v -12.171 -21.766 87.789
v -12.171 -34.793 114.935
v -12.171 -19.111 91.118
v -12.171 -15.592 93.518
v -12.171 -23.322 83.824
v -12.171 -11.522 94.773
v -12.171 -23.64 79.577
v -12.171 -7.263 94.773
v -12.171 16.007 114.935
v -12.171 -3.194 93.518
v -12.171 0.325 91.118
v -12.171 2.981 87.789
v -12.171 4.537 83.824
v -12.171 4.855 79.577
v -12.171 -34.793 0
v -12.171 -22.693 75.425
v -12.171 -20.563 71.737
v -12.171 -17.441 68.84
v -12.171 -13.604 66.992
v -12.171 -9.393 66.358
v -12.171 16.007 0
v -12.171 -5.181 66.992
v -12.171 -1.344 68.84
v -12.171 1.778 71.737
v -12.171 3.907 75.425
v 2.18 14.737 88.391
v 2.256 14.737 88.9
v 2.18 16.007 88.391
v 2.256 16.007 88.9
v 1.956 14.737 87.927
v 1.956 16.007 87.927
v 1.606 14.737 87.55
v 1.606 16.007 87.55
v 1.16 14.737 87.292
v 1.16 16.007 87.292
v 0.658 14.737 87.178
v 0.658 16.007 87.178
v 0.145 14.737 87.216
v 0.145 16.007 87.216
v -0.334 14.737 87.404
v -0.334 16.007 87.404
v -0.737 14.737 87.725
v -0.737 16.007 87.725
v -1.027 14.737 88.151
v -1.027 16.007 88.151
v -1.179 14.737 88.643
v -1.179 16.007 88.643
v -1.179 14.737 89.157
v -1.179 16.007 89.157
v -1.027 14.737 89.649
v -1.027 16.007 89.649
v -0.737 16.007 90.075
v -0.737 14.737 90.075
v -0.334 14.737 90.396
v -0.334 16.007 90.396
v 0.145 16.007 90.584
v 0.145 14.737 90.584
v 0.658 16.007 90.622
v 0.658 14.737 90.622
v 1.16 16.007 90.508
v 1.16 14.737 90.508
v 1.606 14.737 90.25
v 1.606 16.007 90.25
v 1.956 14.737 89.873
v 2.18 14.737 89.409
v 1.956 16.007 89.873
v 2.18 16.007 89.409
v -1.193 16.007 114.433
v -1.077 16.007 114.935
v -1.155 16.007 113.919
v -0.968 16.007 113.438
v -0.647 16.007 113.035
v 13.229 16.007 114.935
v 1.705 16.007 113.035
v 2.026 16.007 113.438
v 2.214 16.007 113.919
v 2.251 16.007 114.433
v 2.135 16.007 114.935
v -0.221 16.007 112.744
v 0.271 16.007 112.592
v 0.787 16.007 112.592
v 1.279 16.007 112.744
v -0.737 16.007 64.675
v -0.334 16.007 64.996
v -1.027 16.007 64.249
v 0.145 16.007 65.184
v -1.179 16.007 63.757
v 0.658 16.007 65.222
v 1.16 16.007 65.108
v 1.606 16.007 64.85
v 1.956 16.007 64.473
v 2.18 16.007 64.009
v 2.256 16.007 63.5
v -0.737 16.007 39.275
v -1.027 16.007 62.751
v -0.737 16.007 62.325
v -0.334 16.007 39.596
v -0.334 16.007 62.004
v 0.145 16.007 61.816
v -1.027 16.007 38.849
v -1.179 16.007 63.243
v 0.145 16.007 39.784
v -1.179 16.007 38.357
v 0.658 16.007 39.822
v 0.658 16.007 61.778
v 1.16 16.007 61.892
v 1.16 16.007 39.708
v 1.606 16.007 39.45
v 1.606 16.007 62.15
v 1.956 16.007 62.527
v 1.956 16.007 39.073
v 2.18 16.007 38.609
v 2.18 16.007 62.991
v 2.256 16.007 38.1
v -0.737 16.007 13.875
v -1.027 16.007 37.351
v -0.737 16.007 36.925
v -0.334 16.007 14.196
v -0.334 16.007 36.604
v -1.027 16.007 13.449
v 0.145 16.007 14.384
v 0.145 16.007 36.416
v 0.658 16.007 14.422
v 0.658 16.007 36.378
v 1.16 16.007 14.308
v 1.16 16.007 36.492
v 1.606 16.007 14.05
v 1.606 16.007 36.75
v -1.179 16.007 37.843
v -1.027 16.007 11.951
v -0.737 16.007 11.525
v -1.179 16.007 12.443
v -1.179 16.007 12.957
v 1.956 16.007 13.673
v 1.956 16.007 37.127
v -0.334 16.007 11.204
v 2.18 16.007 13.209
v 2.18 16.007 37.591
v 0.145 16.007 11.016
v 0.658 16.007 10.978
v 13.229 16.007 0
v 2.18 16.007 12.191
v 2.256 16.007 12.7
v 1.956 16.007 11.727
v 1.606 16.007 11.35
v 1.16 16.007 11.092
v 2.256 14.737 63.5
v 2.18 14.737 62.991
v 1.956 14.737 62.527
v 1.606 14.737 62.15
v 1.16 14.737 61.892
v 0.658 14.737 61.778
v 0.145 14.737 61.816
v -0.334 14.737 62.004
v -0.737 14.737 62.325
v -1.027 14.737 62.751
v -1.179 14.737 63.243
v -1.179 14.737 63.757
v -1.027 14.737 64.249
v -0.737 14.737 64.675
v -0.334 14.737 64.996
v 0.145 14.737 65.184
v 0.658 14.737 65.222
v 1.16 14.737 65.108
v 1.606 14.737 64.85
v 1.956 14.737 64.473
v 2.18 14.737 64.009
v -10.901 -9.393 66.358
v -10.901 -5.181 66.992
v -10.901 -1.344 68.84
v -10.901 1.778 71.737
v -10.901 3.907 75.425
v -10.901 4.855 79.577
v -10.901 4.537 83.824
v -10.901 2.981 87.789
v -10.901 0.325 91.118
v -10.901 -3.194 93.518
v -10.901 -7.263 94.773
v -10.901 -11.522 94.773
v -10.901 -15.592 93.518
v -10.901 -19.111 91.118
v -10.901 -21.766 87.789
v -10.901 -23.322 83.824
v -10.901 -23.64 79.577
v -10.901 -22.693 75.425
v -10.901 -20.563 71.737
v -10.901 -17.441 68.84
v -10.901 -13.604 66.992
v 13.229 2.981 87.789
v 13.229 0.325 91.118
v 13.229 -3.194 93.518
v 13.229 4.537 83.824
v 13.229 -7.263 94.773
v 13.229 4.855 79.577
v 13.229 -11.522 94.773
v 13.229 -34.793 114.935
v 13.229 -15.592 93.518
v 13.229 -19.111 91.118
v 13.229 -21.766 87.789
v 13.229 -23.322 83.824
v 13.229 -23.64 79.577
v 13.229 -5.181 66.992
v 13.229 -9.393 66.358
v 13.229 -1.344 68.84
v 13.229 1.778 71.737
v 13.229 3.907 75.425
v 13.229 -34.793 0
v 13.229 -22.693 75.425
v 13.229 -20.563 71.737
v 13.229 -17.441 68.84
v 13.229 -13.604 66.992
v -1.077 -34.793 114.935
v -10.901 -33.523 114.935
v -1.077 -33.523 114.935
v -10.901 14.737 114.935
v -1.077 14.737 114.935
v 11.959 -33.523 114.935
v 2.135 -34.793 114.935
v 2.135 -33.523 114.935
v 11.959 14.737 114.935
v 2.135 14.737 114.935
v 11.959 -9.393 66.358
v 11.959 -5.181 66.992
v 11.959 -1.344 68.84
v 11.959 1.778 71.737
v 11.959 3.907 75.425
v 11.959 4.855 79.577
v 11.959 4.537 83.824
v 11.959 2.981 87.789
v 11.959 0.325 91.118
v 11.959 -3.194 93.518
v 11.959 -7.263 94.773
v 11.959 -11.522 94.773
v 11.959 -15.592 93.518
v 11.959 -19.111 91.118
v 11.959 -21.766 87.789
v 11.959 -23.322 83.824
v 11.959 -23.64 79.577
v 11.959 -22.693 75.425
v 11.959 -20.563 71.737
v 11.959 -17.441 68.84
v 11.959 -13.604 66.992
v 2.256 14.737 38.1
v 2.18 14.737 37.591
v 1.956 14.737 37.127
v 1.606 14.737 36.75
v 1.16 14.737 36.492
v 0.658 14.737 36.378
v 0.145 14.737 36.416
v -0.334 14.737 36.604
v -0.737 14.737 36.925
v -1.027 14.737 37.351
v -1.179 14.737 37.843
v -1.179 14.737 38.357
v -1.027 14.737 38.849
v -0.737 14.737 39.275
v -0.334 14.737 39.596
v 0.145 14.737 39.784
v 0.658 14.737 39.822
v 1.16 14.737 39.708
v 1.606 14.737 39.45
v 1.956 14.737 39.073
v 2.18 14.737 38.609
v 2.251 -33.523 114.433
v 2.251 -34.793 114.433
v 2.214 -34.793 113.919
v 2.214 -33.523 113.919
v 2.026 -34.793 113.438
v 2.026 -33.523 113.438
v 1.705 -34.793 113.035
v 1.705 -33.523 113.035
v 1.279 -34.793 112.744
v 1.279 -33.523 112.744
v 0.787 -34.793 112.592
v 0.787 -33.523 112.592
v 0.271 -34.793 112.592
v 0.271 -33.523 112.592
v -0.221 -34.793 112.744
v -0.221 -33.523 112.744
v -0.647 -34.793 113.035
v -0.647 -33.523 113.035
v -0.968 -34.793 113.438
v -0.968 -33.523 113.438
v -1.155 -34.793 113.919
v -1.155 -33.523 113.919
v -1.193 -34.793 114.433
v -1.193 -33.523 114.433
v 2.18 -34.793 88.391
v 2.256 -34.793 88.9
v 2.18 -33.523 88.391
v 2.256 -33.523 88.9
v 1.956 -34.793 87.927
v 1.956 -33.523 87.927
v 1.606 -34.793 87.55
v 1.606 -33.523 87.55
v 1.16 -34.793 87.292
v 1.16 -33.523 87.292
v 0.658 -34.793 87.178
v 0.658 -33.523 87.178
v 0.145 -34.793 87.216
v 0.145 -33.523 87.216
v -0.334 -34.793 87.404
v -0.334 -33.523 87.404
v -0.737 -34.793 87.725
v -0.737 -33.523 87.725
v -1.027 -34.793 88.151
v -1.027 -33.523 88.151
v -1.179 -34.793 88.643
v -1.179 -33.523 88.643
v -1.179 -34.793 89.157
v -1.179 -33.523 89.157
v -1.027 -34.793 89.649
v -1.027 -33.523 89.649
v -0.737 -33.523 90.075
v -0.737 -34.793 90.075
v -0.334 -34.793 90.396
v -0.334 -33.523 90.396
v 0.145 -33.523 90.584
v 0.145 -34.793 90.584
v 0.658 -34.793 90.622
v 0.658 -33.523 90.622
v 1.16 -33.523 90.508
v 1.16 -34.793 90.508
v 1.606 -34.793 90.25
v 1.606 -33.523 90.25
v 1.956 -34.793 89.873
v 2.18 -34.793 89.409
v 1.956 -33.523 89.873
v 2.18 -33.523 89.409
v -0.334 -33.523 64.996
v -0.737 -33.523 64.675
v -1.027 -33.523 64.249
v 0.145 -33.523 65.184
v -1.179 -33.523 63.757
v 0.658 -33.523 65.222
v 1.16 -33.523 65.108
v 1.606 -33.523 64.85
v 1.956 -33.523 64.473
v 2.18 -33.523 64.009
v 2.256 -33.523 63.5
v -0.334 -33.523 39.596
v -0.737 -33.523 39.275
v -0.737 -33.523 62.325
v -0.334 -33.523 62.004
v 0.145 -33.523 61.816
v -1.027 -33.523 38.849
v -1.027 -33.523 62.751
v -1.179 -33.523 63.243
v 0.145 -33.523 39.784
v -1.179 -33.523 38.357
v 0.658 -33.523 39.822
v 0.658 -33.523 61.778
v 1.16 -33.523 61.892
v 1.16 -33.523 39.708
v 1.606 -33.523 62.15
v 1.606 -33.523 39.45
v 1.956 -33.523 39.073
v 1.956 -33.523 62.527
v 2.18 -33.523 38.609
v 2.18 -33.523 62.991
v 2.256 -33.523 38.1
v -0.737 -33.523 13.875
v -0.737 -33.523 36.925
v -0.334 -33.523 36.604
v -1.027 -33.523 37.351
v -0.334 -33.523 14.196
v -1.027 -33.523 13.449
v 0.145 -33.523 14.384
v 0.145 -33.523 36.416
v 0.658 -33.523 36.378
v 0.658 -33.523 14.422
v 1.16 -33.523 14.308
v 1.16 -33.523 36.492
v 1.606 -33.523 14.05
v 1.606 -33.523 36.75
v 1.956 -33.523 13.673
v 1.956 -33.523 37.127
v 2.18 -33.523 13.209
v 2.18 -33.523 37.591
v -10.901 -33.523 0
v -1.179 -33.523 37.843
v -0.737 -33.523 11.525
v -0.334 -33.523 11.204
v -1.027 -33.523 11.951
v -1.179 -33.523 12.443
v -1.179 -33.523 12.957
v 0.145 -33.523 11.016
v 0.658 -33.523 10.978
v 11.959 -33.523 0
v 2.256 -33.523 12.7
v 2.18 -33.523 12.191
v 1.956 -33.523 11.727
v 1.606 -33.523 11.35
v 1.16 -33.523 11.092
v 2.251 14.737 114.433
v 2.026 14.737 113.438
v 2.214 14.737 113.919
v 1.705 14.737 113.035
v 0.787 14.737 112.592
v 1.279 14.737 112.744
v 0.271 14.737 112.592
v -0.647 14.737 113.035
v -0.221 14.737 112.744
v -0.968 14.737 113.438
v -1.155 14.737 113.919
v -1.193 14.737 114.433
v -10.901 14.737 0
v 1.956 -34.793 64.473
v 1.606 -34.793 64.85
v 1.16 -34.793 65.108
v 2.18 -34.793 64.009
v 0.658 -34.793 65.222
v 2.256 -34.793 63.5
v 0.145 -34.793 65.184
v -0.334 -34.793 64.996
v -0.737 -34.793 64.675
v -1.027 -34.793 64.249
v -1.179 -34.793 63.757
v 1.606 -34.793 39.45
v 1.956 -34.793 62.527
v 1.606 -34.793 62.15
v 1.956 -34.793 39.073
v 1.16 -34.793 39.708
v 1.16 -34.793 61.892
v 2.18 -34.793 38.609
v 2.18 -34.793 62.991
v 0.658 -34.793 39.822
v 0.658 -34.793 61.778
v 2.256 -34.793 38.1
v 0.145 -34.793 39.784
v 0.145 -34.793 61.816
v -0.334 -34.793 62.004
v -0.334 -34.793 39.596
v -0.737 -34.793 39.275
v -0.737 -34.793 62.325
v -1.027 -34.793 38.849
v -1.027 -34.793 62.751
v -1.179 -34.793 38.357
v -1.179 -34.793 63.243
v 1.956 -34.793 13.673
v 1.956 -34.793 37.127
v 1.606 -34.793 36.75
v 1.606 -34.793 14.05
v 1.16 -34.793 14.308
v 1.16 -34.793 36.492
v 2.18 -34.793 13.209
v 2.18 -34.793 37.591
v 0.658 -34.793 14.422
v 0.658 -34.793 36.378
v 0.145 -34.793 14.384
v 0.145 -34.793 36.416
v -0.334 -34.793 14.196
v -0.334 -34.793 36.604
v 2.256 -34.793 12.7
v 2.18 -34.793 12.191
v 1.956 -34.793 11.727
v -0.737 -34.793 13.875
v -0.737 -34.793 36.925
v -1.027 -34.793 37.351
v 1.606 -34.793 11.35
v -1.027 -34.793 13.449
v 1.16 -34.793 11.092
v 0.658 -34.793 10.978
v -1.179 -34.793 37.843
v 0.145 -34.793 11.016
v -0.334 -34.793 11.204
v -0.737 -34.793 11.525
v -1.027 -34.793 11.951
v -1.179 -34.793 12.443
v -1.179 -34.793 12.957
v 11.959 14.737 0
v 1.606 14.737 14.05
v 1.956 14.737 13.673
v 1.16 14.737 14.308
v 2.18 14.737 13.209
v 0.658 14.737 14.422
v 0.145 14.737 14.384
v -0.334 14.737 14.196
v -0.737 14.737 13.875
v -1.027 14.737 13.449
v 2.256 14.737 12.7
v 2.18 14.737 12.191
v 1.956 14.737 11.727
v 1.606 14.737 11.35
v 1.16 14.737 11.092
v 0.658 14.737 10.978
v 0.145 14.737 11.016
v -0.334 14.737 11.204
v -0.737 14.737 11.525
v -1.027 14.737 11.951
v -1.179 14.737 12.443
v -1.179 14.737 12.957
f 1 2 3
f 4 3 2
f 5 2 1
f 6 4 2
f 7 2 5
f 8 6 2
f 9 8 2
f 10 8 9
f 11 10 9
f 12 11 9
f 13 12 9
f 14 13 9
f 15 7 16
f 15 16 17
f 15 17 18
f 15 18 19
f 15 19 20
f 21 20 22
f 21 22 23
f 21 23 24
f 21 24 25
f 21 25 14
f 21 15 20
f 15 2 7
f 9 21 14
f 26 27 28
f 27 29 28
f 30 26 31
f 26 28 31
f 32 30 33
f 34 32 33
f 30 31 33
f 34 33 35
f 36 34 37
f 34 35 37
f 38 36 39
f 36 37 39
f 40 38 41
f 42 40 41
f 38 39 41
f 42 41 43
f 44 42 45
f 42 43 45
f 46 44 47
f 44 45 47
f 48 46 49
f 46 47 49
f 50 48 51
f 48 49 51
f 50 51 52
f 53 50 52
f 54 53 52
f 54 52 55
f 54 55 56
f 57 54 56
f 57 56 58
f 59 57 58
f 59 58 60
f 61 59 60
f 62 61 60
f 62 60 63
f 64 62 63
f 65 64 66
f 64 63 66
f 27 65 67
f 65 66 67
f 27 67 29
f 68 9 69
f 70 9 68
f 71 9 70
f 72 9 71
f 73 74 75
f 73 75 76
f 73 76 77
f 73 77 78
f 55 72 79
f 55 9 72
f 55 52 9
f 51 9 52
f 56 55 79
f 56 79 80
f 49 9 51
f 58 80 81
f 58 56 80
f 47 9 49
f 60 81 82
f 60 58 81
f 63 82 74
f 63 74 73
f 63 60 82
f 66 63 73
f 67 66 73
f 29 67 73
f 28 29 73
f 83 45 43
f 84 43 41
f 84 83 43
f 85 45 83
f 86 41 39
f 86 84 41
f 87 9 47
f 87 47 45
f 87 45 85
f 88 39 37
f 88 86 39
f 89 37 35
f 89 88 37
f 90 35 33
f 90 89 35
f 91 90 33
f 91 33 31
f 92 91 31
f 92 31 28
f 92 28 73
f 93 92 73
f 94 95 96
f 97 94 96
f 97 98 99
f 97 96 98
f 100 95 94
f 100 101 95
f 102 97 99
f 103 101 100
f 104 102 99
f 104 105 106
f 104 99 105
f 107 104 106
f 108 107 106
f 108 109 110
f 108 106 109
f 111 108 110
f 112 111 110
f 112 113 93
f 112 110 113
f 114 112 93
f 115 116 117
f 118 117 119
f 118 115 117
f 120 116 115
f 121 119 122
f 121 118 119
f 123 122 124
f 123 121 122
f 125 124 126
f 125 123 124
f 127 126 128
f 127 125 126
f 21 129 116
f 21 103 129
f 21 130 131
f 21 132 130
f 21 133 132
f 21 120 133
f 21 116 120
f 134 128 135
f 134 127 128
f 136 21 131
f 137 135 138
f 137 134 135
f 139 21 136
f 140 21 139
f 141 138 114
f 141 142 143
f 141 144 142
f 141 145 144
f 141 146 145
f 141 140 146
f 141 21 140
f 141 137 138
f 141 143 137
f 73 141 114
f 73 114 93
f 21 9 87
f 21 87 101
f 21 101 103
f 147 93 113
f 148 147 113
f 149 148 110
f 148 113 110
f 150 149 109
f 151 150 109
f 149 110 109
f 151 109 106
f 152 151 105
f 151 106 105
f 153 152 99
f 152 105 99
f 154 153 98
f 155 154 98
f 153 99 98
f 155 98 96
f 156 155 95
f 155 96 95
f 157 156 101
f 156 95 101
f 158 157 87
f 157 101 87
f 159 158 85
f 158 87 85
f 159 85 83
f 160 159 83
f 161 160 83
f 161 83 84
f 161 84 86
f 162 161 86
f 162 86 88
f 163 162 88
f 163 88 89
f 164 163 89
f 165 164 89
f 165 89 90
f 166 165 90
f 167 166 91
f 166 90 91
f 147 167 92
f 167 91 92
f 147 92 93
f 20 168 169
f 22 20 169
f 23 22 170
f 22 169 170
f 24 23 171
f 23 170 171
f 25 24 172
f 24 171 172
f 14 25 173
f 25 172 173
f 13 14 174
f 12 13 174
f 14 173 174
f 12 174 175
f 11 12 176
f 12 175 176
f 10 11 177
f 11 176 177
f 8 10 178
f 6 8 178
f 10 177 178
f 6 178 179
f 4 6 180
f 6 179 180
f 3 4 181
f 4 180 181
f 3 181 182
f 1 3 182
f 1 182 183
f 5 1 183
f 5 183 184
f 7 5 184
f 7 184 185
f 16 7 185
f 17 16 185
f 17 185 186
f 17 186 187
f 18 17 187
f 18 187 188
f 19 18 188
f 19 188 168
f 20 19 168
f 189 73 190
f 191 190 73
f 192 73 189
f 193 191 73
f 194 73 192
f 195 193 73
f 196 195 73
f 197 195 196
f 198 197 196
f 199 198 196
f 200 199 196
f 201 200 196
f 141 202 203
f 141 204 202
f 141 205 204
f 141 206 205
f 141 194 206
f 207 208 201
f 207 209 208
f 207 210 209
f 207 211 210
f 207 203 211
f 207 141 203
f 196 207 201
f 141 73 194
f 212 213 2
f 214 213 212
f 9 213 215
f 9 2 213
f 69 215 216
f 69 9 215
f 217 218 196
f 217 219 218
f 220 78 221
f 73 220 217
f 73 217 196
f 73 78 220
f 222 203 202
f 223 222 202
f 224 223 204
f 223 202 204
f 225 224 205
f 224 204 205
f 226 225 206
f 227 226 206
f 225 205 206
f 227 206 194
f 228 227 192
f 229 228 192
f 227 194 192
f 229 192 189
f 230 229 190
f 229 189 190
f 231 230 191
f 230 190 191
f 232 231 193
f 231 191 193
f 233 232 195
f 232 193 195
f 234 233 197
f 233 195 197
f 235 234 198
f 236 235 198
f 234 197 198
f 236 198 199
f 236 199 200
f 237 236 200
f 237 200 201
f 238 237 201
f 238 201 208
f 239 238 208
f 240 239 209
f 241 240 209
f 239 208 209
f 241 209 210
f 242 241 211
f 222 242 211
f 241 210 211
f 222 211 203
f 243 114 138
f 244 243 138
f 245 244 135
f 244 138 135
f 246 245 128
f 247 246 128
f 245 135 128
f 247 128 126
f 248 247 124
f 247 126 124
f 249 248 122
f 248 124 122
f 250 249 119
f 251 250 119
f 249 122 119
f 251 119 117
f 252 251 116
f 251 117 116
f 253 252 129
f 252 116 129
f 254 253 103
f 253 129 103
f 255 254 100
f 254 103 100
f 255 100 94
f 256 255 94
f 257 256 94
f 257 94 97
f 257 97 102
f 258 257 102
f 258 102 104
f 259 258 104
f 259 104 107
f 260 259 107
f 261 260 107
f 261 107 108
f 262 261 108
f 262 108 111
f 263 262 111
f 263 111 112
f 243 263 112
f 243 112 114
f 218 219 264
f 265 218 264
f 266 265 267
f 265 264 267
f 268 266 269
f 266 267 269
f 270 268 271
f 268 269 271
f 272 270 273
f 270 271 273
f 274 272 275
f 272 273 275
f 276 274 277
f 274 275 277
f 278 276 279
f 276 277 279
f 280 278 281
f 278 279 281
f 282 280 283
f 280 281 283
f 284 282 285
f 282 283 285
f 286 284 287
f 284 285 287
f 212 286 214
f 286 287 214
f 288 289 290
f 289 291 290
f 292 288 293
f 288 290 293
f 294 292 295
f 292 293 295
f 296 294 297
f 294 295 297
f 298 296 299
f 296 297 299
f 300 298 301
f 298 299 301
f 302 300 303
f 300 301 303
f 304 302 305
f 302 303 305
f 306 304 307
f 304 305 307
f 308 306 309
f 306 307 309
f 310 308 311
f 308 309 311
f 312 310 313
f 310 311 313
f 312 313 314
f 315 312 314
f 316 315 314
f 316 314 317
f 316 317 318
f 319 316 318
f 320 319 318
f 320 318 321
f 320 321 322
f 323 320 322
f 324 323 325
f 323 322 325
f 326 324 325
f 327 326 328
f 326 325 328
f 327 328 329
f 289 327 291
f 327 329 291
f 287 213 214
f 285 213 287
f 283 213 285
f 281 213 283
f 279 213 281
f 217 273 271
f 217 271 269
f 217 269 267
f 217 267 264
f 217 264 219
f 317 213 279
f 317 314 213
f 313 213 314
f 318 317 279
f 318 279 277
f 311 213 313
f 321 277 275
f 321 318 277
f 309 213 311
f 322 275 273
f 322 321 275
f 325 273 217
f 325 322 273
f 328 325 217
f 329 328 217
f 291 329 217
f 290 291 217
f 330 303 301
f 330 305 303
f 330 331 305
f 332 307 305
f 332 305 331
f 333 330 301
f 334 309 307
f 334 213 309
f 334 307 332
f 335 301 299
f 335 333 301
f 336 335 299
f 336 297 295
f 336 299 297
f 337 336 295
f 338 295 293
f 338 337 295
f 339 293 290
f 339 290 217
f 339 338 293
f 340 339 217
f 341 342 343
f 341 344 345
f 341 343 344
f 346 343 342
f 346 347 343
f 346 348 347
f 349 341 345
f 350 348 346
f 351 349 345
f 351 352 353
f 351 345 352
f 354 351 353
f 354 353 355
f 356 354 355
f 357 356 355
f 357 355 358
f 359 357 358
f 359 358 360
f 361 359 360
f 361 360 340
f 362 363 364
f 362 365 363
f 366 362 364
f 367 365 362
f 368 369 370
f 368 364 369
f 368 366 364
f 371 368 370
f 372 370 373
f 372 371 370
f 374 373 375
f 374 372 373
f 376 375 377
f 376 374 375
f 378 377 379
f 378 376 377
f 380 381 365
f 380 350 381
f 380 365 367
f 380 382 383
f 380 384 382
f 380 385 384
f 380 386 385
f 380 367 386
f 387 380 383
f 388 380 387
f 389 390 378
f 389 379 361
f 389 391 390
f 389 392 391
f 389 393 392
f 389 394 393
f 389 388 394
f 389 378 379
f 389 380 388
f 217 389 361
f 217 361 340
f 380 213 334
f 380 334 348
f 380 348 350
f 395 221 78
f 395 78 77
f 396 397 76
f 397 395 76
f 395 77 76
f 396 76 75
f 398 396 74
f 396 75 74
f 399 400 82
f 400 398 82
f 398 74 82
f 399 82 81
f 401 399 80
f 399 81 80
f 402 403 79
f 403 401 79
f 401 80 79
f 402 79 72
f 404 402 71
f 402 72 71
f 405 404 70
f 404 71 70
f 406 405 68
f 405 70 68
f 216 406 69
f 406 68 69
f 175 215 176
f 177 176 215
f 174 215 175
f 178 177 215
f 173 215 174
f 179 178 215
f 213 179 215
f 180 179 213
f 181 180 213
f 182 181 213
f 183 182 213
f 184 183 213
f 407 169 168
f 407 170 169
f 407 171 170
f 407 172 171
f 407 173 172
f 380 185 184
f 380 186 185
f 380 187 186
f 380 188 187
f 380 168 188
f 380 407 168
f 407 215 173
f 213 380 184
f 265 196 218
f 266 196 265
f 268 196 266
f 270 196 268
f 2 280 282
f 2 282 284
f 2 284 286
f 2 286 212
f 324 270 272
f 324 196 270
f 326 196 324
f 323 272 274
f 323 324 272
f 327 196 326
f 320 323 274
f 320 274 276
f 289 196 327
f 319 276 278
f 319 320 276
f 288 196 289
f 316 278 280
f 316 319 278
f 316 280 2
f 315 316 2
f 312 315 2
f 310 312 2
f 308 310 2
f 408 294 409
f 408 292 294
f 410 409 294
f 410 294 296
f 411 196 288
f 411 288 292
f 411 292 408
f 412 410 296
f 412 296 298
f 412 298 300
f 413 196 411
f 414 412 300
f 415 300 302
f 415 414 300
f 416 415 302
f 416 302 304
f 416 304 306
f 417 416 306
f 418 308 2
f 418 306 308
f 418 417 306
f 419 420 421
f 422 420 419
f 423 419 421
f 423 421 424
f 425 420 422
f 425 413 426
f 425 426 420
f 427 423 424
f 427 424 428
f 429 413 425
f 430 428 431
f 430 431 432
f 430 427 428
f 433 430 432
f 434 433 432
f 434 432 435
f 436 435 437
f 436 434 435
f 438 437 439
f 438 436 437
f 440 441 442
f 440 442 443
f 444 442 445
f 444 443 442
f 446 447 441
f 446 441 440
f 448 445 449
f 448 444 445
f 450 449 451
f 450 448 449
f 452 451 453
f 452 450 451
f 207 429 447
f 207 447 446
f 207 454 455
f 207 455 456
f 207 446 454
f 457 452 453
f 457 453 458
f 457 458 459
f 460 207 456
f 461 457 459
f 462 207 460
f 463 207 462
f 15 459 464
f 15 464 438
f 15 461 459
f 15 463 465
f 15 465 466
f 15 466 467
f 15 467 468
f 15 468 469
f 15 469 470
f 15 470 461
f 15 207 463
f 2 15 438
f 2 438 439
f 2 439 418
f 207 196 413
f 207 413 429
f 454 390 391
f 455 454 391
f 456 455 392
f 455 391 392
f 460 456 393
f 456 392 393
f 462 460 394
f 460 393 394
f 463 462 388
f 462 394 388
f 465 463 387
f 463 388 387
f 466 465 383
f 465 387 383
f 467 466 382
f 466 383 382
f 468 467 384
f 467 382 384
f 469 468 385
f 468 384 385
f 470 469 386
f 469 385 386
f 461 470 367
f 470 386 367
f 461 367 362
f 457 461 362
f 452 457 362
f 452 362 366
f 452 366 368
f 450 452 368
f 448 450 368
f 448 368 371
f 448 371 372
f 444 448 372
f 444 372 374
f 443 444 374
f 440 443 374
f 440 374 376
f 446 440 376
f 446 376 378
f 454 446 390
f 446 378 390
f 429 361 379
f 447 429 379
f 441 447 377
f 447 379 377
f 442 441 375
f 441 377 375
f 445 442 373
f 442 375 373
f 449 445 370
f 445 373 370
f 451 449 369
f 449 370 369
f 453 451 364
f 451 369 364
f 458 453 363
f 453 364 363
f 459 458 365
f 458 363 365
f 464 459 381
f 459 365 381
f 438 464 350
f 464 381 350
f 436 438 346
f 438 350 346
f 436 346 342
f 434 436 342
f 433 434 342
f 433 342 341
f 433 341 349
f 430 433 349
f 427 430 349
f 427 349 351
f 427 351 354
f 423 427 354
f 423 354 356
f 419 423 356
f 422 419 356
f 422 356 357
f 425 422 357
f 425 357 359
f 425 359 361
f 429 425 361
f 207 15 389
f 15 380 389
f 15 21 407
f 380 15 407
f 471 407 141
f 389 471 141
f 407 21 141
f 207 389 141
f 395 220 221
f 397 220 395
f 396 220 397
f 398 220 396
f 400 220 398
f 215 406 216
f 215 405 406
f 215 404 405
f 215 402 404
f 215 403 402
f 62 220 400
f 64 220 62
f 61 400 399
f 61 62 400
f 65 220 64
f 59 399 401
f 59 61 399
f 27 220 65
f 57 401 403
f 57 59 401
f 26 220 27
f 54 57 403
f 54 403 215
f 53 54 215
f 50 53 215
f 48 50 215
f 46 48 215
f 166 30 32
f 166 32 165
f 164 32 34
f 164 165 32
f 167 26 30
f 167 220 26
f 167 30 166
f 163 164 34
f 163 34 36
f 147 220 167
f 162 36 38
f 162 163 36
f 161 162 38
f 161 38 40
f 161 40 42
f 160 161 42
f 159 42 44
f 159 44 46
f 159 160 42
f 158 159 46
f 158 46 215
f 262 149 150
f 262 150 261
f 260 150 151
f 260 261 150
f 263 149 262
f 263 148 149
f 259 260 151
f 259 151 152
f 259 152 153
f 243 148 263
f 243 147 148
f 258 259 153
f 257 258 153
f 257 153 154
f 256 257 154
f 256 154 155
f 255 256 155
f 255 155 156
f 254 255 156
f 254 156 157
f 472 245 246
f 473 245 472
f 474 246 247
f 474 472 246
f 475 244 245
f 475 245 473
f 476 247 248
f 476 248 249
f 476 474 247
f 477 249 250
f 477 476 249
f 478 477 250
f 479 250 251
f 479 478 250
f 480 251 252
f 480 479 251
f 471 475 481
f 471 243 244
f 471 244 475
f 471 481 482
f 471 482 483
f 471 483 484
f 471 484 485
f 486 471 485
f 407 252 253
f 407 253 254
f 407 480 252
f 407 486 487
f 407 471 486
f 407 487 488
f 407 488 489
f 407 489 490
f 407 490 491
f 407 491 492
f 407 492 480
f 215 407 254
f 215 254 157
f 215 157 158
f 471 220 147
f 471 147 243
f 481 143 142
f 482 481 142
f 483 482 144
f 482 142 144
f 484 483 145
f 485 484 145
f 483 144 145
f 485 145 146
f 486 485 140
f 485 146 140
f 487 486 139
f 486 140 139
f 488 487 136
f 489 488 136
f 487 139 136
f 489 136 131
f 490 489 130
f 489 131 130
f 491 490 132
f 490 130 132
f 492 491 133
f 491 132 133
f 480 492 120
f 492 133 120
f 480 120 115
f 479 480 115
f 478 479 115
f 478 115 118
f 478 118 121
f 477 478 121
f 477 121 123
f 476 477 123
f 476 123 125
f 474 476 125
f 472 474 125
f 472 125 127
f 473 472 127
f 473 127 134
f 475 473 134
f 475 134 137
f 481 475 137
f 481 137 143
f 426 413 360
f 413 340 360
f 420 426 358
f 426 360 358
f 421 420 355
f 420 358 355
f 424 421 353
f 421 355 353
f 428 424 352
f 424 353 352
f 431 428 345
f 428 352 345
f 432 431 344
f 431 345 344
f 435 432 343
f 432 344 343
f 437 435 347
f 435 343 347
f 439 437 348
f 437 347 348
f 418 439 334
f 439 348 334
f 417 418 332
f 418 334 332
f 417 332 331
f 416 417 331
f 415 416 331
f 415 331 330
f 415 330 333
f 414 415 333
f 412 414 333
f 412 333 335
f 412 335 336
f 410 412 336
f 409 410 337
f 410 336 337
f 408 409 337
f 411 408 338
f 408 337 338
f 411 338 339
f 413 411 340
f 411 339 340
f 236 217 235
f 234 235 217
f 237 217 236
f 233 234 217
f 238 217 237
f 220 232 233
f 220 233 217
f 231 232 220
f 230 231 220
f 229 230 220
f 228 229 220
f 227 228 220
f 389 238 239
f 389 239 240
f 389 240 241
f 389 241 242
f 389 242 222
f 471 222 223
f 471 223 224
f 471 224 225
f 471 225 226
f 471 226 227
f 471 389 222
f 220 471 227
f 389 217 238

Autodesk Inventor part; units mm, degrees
ref_plane "YZ Plane" through (0, 0, 0) normal (1, 0, 0) x (0, 1, 0)
ref_plane "XZ Plane" through (0, 0, 0) normal (0, 1, 0) x (-1, 0, 0)
ref_plane "XY Plane" through (0, 0, 0) normal (0, 0, 1) x (1, 0, 0)
sketch "Sketch1" plane through (0, 0, 0) normal (0, 0, 1) x (1, 0, 0)
  line L0 (-12.1708, 16.0073) -> (13.2292, 16.0073)
  line L1 (13.2292, 16.0073) -> (13.2292, -34.7927)
  line L2 (13.2292, -34.7927) -> (-12.1708, -34.7927)
  line L3 (-12.1708, -34.7927) -> (-12.1708, 16.0073)
  line L4 (11.9592, 14.7373) -> (-10.9008, 14.7373)
  line L5 (-10.9008, 14.7373) -> (-10.9008, -33.5227)
  line L6 (-10.9008, -33.5227) -> (11.9592, -33.5227)
  line L7 (11.9592, -33.5227) -> (11.9592, 14.7373)
  point P0 (0, 0)
  dimension "d0" = 25.4
  dimension "d1" = 50.8
  dimension "d2" = 1.27
extrude "Extrusion1" add sketch "Sketch1" along normal blind 114.935
sketch "Sketch2" plane through (-12.1708, 16.0073, 0) normal (0, 1, 0) x (1, 0, 0)
  circle A0 centre (12.7, -12.7) radius 1.7272
  line L0 (25.4, 0) -> (0, 0) projected
  line L1 (0, 0) -> (0, -114.935) projected
  point P0 (12.1708, 0)
  dimension "d5" = 3.4544
  dimension "d6" = 12.7
  dimension "d7" = 12.7
extrude "Extrusion2" cut sketch "Sketch2" against normal through all
pattern_linear "Rectangular Pattern1" count 11 spacing 25.4 along (0, 0, 1) of "Extrusion2"
sketch "Sketch3" plane through (13.2292, -34.7927, 0) normal (1, 0, 0) x (0, 0, -1)
  circle A0 centre (-80.645, 25.4) radius 14.2875
  line L0 (0, 0) -> (0, 50.8) projected
  line L1 (-114.935, 0) -> (-114.935, 50.8) projected
  point P0 (0, 34.7927)
  dimension "d15" = 28.575
  dimension "d20" = 80.645
extrude "Extrusion3" cut sketch "Sketch3" against normal through all
equation "\"d3\" = d13"
equation "\"d10\" = d14"
equation "\"d13\" = 114.935"
equation "\"d14\" = d13"
properties part number "VerseFrame 5in STOCK"
